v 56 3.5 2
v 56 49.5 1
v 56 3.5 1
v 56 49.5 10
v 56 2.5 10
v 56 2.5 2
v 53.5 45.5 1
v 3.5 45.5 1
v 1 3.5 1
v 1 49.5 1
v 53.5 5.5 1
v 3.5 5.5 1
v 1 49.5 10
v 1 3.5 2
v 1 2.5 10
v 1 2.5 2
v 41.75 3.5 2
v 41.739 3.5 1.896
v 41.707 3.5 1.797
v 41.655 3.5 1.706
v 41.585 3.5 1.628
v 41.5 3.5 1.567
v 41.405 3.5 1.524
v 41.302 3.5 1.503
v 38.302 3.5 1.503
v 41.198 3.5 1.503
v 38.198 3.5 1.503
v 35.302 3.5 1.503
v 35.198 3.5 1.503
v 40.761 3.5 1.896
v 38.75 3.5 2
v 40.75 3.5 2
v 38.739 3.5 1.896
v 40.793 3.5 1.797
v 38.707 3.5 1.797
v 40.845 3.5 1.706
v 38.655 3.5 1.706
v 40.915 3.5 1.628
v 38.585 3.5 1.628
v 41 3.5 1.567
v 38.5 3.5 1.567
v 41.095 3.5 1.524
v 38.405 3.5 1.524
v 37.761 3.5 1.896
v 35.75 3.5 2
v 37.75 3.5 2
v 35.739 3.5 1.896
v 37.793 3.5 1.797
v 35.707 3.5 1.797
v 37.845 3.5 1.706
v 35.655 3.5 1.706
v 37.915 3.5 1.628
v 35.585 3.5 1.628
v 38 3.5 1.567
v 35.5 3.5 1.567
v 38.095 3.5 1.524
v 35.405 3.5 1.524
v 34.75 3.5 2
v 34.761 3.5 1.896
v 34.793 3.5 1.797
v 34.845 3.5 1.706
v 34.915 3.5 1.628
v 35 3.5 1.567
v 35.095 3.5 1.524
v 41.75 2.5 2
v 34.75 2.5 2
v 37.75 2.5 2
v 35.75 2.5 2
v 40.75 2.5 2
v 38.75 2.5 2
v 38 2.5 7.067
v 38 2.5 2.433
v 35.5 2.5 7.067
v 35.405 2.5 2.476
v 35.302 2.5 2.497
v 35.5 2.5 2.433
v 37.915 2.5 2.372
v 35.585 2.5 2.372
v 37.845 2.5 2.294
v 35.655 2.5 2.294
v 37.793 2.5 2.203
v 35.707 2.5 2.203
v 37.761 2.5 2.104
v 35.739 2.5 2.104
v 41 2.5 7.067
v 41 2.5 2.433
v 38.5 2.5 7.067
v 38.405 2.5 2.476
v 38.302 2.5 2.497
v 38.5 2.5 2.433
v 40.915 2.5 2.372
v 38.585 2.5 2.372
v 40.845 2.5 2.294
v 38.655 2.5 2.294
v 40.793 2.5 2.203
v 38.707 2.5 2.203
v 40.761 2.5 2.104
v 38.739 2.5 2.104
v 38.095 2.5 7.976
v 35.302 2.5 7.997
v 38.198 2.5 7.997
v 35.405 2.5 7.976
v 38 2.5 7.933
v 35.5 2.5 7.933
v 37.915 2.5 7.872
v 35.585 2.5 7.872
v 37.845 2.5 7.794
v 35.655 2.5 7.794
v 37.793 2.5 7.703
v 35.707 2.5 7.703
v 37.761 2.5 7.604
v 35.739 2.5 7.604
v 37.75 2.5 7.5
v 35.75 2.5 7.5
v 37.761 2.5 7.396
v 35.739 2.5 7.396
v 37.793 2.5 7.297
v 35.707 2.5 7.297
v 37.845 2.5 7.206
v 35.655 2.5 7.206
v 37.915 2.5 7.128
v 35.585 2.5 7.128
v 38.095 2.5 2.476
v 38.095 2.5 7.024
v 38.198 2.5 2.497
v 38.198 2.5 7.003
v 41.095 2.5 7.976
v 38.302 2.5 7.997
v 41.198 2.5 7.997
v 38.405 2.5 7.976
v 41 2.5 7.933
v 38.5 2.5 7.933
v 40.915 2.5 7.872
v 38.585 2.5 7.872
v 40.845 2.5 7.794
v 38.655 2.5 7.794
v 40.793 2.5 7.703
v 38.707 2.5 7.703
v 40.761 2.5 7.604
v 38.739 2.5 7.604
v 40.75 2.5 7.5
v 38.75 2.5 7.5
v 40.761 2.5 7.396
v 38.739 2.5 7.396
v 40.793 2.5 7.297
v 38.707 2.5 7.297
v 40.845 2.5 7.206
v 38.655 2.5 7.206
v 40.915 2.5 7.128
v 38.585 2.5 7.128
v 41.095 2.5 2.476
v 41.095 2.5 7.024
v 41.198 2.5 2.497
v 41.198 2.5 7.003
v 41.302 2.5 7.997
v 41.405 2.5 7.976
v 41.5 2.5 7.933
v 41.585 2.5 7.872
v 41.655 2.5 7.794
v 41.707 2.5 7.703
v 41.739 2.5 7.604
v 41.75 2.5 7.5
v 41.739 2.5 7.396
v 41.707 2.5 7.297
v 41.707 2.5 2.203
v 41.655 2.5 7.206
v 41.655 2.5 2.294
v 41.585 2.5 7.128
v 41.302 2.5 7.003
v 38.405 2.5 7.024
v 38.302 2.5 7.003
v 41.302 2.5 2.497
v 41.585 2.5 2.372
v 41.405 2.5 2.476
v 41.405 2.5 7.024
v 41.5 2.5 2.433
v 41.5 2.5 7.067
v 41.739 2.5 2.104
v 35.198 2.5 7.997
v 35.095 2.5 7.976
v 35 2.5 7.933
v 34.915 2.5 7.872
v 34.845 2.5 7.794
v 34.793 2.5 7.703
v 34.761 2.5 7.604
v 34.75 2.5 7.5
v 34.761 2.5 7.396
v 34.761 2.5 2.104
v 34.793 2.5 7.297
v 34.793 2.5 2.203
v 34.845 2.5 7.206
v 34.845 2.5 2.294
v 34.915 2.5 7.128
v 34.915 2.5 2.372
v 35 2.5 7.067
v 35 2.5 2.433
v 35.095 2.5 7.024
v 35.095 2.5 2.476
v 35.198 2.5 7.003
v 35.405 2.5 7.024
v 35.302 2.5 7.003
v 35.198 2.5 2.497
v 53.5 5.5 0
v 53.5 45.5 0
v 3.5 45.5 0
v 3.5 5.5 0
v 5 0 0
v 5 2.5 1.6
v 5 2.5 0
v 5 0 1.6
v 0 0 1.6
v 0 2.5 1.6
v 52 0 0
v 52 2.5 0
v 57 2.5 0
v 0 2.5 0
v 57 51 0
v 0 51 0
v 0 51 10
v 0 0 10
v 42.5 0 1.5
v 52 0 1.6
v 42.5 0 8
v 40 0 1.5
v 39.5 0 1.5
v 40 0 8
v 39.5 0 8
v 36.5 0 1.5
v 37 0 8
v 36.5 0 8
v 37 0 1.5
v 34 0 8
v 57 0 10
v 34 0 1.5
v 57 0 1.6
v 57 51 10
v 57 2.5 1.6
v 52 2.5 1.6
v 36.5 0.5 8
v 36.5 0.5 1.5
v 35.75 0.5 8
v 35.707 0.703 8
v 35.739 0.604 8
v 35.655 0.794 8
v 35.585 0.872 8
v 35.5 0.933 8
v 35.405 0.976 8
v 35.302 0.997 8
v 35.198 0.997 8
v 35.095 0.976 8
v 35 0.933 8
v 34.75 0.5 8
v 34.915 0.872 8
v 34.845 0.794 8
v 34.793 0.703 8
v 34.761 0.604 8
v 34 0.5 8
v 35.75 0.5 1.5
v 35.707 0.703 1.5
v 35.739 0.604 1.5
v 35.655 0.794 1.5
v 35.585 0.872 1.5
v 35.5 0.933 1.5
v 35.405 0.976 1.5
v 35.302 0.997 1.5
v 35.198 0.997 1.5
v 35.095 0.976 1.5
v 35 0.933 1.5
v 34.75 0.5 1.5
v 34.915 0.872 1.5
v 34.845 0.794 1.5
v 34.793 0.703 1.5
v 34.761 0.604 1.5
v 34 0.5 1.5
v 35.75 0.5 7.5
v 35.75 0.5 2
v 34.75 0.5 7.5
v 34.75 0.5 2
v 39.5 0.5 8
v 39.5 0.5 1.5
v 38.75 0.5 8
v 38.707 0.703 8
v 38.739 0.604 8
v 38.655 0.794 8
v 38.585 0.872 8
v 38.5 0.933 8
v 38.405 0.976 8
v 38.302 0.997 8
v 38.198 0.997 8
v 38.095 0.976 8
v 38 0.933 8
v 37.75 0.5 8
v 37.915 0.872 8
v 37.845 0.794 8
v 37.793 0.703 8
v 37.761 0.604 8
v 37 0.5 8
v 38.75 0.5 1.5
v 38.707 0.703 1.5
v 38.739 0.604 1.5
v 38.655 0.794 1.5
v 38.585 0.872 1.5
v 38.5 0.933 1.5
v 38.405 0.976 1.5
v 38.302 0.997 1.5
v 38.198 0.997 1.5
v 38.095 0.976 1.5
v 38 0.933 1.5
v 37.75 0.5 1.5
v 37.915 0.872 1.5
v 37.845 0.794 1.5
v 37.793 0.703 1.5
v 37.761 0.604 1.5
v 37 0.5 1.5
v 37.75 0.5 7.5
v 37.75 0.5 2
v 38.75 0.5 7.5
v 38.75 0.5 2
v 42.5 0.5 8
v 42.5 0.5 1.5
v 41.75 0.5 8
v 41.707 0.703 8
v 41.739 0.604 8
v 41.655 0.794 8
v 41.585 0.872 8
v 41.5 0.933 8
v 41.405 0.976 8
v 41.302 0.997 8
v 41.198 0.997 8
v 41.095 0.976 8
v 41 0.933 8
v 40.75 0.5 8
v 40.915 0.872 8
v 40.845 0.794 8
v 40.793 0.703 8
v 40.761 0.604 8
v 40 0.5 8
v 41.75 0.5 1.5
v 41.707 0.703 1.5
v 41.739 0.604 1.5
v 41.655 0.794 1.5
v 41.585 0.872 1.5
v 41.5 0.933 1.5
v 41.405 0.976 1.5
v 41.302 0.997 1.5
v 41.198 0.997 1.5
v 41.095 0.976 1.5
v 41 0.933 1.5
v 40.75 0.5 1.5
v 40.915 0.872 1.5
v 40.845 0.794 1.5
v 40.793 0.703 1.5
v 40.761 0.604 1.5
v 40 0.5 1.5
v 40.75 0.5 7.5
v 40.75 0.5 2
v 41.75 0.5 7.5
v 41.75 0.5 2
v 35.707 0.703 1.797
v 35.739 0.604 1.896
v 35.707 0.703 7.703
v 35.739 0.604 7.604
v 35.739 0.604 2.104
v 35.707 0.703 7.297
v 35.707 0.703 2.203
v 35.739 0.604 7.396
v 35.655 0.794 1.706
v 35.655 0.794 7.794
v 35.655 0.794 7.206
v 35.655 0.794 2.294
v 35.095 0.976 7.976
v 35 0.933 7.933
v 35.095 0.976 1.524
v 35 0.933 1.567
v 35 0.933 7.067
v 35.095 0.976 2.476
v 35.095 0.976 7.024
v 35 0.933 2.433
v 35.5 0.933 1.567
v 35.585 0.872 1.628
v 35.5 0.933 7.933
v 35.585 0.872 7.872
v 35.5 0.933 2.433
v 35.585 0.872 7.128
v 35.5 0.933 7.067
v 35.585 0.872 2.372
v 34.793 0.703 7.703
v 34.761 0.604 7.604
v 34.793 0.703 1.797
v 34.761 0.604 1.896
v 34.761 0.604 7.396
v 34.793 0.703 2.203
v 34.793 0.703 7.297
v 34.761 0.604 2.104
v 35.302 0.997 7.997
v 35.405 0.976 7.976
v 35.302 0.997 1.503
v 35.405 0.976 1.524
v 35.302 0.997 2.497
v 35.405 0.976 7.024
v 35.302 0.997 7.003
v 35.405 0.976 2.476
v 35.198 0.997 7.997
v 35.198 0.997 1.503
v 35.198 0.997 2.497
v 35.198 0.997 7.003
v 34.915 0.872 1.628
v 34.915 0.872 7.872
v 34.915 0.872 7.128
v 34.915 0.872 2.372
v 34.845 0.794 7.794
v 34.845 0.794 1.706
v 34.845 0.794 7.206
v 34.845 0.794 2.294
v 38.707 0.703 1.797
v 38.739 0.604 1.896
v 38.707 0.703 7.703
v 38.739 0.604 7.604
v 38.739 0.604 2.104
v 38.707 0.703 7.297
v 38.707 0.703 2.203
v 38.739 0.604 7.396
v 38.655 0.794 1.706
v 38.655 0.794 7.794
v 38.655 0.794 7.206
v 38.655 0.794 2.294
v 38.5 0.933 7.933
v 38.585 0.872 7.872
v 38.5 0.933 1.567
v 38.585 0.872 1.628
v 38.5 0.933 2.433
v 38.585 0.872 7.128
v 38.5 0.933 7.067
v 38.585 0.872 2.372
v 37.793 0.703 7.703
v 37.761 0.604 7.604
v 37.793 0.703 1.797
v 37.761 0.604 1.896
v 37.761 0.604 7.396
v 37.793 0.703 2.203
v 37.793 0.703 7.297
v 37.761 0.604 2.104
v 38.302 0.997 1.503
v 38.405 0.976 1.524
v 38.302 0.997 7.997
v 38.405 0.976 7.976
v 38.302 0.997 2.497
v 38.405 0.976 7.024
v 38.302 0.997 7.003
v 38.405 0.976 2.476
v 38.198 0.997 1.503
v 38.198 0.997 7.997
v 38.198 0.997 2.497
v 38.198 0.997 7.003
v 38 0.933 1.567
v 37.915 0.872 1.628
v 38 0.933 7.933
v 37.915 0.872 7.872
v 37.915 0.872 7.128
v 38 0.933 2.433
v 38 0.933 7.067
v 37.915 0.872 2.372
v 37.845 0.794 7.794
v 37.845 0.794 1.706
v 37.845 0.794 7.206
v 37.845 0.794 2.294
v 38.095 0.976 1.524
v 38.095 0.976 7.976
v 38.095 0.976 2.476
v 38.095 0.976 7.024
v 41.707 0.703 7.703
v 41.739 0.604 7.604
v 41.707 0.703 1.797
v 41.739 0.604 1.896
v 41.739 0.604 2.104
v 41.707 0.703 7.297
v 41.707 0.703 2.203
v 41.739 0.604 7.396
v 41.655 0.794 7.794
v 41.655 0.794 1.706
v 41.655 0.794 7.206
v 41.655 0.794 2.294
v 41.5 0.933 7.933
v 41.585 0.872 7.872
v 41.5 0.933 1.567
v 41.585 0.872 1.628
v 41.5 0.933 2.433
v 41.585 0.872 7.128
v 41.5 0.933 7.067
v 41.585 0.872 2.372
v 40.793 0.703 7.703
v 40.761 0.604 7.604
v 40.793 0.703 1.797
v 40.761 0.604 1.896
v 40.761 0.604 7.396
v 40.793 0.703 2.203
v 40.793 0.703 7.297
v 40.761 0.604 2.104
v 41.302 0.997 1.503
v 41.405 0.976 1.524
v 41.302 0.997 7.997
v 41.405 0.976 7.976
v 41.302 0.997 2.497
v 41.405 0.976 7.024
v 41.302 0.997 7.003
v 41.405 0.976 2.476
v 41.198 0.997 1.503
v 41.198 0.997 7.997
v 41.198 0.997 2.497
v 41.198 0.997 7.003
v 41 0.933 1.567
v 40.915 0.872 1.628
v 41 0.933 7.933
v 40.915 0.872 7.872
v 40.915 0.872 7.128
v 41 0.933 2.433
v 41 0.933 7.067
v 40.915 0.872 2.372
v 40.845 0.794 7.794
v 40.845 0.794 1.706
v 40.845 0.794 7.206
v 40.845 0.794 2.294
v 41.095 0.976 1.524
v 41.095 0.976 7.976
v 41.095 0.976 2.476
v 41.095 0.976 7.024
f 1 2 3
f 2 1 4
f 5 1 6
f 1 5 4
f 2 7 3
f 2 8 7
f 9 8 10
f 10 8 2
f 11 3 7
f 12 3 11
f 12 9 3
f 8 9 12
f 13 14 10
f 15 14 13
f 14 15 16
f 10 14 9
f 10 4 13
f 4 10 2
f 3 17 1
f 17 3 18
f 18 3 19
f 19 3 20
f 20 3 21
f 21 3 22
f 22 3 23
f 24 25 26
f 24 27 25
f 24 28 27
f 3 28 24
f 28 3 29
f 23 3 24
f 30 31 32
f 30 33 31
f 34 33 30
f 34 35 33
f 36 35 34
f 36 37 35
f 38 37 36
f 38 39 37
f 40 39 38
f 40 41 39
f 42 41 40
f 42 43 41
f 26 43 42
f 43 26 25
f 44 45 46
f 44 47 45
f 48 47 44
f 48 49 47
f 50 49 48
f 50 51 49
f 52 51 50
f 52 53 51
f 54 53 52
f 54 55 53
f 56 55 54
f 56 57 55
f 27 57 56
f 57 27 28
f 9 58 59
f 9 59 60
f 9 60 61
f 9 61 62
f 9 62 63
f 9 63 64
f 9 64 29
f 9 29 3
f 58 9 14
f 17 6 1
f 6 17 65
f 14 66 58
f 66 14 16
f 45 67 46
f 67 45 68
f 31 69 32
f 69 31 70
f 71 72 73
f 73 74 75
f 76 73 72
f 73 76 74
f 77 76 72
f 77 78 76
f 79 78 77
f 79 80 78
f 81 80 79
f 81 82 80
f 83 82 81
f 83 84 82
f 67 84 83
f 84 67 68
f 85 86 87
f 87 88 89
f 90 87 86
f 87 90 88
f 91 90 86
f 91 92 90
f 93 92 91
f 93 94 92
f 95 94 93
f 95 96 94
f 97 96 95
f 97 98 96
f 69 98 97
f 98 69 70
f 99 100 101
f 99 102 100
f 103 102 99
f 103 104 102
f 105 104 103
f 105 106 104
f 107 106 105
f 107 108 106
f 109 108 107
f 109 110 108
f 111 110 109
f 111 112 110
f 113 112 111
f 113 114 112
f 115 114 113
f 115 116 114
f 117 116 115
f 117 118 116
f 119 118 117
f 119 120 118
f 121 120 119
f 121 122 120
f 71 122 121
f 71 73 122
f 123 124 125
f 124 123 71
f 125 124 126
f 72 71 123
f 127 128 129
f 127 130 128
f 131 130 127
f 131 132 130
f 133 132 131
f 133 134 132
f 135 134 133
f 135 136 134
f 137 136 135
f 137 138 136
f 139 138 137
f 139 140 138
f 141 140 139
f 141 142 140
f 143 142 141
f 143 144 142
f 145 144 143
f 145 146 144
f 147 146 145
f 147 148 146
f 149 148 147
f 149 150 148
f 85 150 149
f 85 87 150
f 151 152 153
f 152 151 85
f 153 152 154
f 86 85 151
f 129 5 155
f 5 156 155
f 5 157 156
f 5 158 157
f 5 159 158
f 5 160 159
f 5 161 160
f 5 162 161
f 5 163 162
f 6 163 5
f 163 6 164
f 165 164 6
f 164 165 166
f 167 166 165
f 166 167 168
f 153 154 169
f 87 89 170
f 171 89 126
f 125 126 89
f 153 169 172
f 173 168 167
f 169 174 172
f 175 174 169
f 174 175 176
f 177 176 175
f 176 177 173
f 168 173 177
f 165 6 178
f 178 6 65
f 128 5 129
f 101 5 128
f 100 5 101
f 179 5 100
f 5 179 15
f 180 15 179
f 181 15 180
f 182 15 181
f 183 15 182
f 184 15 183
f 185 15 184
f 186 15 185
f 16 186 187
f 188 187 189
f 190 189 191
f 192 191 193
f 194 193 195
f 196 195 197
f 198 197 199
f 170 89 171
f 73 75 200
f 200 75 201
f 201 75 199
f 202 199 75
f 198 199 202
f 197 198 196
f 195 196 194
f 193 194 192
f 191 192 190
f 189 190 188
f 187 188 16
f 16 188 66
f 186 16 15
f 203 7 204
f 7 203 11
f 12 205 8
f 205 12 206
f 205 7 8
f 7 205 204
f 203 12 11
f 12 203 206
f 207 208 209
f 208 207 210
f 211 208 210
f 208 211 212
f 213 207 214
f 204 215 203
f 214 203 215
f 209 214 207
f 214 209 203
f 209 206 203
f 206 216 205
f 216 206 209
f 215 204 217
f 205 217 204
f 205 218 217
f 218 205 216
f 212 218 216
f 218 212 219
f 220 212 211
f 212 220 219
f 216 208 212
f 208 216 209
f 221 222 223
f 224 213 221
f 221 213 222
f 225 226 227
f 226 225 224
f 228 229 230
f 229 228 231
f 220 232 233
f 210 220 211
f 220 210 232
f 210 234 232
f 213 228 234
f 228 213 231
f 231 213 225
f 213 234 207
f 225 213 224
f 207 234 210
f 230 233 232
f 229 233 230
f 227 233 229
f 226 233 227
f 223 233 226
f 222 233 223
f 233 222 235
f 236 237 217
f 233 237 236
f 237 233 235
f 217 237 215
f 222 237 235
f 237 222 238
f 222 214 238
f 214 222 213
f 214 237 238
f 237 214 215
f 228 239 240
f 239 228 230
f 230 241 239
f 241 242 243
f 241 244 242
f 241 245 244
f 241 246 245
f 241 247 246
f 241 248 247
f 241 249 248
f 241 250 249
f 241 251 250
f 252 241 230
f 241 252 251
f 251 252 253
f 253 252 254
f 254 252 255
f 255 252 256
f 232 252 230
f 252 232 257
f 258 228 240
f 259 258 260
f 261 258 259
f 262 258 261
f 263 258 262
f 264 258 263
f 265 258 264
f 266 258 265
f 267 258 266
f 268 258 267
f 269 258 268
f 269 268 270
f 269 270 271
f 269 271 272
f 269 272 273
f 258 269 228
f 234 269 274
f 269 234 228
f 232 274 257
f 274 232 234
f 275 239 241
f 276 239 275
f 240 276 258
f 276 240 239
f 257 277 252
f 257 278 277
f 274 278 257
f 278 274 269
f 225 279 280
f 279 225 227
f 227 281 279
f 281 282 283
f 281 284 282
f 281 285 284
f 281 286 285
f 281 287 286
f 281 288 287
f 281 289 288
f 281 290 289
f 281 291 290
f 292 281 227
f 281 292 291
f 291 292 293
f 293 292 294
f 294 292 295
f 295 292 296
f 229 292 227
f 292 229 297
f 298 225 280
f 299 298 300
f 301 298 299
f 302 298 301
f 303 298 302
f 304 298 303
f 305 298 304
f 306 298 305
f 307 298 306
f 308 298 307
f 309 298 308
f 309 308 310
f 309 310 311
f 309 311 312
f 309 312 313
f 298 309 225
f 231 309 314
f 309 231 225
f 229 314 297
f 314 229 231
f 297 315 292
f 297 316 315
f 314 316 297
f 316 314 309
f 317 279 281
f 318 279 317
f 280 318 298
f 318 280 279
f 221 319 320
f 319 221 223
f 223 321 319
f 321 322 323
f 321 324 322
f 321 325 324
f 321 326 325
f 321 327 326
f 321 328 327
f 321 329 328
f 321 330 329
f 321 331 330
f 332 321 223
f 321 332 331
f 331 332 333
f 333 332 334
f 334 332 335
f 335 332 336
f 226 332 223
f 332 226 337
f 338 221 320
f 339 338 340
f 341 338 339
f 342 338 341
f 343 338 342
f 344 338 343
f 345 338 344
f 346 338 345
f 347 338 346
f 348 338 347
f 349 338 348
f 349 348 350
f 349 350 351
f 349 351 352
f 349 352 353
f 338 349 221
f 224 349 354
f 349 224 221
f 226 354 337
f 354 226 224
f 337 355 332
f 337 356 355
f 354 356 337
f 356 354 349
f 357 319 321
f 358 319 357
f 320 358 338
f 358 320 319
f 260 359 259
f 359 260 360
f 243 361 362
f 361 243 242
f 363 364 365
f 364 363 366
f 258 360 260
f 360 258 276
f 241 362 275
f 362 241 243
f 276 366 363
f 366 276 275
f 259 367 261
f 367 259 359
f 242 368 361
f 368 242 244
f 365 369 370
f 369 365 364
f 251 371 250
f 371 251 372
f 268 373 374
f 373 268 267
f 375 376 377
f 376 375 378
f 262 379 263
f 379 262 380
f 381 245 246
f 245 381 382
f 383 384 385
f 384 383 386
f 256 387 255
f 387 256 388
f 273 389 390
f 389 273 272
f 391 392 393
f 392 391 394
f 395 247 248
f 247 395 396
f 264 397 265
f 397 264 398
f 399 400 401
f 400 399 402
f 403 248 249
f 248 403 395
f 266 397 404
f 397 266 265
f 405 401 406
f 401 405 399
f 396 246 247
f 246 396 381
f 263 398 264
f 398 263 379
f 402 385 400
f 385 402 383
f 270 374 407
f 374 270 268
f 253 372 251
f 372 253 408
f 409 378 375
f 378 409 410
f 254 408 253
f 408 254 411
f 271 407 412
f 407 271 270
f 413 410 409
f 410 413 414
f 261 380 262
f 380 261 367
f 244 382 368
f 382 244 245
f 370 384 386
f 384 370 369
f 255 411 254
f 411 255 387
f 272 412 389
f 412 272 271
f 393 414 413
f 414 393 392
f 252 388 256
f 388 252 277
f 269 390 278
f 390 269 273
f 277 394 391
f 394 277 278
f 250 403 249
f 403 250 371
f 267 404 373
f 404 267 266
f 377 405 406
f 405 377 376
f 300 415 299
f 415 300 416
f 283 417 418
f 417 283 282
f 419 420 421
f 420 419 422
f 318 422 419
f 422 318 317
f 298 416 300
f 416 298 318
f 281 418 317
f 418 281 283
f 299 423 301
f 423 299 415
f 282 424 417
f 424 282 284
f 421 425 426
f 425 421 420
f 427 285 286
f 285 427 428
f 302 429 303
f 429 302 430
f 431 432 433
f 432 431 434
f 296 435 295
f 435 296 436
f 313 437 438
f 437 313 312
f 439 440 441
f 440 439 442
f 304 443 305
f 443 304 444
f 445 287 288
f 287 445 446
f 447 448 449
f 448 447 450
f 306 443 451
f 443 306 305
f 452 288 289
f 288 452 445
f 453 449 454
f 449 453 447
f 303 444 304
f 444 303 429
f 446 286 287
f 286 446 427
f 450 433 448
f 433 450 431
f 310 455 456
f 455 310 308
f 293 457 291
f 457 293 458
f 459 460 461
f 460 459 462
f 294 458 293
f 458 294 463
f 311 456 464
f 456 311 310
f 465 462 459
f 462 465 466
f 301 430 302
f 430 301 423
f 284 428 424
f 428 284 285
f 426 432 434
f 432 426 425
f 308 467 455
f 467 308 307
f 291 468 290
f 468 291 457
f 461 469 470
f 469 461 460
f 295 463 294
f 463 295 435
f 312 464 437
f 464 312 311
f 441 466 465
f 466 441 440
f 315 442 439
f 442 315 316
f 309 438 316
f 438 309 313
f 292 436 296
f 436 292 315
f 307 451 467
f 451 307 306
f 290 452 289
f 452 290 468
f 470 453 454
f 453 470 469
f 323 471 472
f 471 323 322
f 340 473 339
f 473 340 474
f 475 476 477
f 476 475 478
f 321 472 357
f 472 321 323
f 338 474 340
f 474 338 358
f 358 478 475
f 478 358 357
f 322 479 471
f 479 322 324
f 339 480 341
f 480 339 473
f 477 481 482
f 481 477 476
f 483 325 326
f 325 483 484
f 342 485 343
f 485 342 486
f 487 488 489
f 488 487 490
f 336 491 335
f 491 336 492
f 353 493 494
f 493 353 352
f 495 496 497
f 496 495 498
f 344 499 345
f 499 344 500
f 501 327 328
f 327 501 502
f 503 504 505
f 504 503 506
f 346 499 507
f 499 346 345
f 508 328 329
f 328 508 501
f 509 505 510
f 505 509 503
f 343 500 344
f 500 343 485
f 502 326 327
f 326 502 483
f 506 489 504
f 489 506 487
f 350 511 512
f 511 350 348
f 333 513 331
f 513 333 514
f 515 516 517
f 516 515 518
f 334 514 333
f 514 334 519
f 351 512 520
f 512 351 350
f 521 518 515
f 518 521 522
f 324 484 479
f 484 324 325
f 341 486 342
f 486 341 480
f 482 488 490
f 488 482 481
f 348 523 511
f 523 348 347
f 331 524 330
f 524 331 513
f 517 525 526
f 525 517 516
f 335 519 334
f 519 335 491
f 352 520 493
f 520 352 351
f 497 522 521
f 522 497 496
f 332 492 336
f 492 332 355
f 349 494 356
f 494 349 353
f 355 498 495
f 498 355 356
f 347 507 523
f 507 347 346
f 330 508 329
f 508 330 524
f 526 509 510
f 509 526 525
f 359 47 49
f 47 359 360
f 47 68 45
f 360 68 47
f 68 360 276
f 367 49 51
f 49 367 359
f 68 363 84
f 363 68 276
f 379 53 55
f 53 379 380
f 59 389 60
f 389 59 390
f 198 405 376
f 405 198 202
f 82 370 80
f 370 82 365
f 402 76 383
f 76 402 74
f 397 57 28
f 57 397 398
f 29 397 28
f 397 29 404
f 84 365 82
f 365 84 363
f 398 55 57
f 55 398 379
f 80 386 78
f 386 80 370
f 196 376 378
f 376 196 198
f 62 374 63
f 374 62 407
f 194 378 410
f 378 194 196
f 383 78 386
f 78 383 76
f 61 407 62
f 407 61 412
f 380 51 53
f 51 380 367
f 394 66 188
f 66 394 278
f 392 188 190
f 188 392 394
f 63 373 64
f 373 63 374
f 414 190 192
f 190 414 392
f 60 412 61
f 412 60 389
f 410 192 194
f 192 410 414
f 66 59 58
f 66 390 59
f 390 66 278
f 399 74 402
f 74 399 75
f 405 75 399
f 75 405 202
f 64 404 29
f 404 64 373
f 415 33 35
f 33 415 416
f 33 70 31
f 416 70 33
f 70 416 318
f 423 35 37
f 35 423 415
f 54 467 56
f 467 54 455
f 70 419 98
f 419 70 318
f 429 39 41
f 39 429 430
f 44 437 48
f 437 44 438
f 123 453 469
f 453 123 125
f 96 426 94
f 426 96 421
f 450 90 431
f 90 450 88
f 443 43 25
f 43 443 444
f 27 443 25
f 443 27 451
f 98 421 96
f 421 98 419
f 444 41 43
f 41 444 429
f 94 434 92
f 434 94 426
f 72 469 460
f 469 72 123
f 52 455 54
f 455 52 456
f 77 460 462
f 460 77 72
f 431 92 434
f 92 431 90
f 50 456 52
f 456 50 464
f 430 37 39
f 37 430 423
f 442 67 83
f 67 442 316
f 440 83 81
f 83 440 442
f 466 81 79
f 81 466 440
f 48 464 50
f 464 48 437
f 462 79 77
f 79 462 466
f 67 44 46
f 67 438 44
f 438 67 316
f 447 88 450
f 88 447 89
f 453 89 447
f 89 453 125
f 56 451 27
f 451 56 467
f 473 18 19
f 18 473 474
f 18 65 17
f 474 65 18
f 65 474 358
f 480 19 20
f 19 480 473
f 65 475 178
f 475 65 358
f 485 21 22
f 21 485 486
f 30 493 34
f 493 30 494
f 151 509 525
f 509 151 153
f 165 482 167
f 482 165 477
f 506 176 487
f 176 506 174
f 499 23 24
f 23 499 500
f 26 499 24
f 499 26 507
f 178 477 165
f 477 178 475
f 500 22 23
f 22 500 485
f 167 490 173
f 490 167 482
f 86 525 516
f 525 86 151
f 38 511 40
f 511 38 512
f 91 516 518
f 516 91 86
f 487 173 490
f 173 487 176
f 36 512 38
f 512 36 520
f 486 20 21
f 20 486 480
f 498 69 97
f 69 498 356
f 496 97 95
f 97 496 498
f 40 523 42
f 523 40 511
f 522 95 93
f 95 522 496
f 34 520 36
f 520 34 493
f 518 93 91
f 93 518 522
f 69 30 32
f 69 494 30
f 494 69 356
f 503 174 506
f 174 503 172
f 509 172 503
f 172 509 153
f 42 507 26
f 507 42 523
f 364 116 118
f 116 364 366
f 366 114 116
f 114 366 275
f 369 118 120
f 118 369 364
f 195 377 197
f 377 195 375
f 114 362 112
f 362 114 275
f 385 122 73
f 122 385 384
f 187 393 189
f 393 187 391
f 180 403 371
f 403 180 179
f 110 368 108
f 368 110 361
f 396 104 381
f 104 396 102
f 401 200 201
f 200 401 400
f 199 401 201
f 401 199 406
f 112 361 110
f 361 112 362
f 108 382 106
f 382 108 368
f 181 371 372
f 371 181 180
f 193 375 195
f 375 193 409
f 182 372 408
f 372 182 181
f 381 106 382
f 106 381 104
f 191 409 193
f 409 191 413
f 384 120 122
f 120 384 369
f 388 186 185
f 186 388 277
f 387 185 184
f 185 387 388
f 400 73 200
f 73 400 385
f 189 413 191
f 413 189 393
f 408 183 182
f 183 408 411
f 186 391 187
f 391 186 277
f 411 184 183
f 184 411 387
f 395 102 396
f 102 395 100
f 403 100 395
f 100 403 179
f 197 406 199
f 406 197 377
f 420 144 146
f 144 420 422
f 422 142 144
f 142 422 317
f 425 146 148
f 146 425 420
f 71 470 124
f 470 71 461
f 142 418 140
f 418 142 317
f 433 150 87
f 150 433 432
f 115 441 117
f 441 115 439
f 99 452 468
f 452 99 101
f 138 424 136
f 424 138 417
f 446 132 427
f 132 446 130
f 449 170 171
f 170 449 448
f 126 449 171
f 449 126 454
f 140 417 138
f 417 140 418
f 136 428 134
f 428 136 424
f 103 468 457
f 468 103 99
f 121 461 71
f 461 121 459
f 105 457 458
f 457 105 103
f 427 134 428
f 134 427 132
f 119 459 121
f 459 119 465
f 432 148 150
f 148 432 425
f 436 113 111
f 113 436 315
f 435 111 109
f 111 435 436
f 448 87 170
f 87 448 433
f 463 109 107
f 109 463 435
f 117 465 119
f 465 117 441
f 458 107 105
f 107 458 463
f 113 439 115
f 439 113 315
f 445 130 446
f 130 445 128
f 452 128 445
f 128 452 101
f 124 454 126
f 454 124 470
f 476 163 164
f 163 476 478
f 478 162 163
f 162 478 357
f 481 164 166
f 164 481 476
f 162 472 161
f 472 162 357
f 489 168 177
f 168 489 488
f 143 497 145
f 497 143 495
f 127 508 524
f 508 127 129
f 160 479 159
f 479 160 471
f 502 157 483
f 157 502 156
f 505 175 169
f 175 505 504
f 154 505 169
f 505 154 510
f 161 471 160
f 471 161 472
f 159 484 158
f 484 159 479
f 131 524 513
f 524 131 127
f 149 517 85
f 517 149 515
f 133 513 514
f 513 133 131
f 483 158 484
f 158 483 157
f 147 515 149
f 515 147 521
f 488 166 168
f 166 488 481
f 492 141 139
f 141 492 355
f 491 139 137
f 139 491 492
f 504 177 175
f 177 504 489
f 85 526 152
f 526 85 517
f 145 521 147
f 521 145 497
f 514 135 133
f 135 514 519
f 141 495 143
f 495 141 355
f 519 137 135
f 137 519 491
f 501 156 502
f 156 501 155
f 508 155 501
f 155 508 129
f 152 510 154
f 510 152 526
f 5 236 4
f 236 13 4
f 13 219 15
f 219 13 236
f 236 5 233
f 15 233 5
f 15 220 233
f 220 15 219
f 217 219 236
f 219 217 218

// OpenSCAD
$fn=30;

center_hole=1;

module cutouts() {
    /* center hole */
    translate([1,3.5,1]) 
        cube([55,46,11], false);
    translate([1,2.5,2]) 
        cube([55,46,11], false);

    if ( center_hole )
        translate([3.5,5.5,-1]) 
            cube([50,40,11], false);
    
    /* hold downs */
    cube([5,2.5,1.6], false);  
    translate([52,0,0])
       cube([5,2.5,1.6], false);
    
    /* electrical connections */
    translate([34,-0.5,1.5]) 
        cube([2.5,1,6.5], false);
    translate([37,-0.5,1.5]) 
        cube([2.5,1,6.5], false);
    translate([40,-0.5,1.5]) 
        cube([2.5,1,6.5], false);

    /* wire guides */
    translate([35.25,0.5,1.5]) 
        cylinder(6.5, d=1, true);
    translate([38.25,0.5,1.5]) 
        cylinder(6.5, d=1, true);
    translate([41.25,0.5,1.5]) 
        cylinder(6.5, d=1, true);
    translate([35.25,0.5,2])
        rotate([-90,0,0])
            cylinder(6.5, d=1, true);
    translate([38.25,0.5,2])
        rotate([-90,0,0])
            cylinder(6.5, d=1, true);
    translate([41.25,0.5,2])
        rotate([-90,0,0])
            cylinder(6.5, d=1, true);
    translate([35.25,0.5,7.5])
        rotate([-90,0,0])
            cylinder(6.5, d=1, true);
    translate([38.25,0.5,7.5])
        rotate([-90,0,0])
            cylinder(6.5, d=1, true);
    translate([41.25,0.5,7.5])
        rotate([-90,0,0])
            cylinder(6.5, d=1, true);
};

difference() {
    cube([57,51,10], false);
    cutouts();
};
